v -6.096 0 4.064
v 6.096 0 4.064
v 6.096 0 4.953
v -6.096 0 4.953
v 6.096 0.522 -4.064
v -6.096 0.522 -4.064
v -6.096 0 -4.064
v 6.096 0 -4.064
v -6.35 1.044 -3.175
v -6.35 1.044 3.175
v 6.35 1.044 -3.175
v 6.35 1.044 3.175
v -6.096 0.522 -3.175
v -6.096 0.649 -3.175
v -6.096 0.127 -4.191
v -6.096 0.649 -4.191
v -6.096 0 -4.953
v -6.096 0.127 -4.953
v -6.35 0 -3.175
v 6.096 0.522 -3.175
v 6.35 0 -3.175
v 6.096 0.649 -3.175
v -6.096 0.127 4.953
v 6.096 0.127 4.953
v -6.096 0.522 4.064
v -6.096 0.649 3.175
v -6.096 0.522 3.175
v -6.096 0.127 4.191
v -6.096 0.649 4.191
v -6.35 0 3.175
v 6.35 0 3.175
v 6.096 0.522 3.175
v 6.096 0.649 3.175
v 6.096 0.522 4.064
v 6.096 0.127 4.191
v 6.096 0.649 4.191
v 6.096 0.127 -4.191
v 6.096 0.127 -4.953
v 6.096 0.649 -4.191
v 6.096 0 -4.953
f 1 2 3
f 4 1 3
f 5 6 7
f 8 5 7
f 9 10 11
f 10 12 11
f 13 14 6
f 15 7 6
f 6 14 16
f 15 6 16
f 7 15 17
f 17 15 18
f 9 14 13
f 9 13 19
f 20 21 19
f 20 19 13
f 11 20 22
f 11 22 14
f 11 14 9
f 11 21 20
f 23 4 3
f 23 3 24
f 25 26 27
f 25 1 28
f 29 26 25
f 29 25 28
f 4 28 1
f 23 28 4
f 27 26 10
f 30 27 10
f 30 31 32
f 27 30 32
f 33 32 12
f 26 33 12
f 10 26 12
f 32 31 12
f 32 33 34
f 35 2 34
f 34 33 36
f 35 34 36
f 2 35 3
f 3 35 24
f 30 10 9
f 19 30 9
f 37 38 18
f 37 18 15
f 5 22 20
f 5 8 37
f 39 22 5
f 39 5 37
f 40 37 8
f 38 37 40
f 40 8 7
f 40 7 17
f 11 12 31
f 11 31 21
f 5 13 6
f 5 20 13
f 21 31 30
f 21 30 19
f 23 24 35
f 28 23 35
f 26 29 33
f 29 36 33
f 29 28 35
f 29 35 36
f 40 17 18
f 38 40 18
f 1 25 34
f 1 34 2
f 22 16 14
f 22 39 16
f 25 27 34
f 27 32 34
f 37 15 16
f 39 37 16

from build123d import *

# Parameters (mm, degrees)
SKETCH1_W           = 6.35
SKETCH1_H           = 1.044000004
BOSS_EXTRUDE1_DEPTH = 6.35
EXTRUDE_THIN1_DEPTH = 6.096


with BuildPart() as part:
    # Sketch1 → Boss-Extrude1 (new body, symmetric)
    with BuildSketch(Plane(origin=(0, 0, 0), x_dir=(0, 0, -1), z_dir=(1, 0, 0))):
        with Locations((0, 0.522000002)):
            Rectangle(SKETCH1_W, SKETCH1_H)
    extrude(amount=BOSS_EXTRUDE1_DEPTH, both=True)

    # Sketch2 → Extrude-Thin1 (add, symmetric)
    with BuildSketch(Plane(origin=(0, 0, 0), x_dir=(0, 0, -1), z_dir=(1, 0, 0))):
        Polygon((3.175, 0.522000002), (4.064, 0.522000002), (4.064, 0), (4.953, 0), (4.953, 0.127), (4.191, 0.127), (4.191, 0.649000002), (3.175, 0.649000002), align=None)
    extrude_thin1 = extrude(amount=EXTRUDE_THIN1_DEPTH, both=True)

    # Mirror1: Extrude-Thin1 across plane
    add(extrude_thin1.mirror(Plane.XY))


solid = part.part
